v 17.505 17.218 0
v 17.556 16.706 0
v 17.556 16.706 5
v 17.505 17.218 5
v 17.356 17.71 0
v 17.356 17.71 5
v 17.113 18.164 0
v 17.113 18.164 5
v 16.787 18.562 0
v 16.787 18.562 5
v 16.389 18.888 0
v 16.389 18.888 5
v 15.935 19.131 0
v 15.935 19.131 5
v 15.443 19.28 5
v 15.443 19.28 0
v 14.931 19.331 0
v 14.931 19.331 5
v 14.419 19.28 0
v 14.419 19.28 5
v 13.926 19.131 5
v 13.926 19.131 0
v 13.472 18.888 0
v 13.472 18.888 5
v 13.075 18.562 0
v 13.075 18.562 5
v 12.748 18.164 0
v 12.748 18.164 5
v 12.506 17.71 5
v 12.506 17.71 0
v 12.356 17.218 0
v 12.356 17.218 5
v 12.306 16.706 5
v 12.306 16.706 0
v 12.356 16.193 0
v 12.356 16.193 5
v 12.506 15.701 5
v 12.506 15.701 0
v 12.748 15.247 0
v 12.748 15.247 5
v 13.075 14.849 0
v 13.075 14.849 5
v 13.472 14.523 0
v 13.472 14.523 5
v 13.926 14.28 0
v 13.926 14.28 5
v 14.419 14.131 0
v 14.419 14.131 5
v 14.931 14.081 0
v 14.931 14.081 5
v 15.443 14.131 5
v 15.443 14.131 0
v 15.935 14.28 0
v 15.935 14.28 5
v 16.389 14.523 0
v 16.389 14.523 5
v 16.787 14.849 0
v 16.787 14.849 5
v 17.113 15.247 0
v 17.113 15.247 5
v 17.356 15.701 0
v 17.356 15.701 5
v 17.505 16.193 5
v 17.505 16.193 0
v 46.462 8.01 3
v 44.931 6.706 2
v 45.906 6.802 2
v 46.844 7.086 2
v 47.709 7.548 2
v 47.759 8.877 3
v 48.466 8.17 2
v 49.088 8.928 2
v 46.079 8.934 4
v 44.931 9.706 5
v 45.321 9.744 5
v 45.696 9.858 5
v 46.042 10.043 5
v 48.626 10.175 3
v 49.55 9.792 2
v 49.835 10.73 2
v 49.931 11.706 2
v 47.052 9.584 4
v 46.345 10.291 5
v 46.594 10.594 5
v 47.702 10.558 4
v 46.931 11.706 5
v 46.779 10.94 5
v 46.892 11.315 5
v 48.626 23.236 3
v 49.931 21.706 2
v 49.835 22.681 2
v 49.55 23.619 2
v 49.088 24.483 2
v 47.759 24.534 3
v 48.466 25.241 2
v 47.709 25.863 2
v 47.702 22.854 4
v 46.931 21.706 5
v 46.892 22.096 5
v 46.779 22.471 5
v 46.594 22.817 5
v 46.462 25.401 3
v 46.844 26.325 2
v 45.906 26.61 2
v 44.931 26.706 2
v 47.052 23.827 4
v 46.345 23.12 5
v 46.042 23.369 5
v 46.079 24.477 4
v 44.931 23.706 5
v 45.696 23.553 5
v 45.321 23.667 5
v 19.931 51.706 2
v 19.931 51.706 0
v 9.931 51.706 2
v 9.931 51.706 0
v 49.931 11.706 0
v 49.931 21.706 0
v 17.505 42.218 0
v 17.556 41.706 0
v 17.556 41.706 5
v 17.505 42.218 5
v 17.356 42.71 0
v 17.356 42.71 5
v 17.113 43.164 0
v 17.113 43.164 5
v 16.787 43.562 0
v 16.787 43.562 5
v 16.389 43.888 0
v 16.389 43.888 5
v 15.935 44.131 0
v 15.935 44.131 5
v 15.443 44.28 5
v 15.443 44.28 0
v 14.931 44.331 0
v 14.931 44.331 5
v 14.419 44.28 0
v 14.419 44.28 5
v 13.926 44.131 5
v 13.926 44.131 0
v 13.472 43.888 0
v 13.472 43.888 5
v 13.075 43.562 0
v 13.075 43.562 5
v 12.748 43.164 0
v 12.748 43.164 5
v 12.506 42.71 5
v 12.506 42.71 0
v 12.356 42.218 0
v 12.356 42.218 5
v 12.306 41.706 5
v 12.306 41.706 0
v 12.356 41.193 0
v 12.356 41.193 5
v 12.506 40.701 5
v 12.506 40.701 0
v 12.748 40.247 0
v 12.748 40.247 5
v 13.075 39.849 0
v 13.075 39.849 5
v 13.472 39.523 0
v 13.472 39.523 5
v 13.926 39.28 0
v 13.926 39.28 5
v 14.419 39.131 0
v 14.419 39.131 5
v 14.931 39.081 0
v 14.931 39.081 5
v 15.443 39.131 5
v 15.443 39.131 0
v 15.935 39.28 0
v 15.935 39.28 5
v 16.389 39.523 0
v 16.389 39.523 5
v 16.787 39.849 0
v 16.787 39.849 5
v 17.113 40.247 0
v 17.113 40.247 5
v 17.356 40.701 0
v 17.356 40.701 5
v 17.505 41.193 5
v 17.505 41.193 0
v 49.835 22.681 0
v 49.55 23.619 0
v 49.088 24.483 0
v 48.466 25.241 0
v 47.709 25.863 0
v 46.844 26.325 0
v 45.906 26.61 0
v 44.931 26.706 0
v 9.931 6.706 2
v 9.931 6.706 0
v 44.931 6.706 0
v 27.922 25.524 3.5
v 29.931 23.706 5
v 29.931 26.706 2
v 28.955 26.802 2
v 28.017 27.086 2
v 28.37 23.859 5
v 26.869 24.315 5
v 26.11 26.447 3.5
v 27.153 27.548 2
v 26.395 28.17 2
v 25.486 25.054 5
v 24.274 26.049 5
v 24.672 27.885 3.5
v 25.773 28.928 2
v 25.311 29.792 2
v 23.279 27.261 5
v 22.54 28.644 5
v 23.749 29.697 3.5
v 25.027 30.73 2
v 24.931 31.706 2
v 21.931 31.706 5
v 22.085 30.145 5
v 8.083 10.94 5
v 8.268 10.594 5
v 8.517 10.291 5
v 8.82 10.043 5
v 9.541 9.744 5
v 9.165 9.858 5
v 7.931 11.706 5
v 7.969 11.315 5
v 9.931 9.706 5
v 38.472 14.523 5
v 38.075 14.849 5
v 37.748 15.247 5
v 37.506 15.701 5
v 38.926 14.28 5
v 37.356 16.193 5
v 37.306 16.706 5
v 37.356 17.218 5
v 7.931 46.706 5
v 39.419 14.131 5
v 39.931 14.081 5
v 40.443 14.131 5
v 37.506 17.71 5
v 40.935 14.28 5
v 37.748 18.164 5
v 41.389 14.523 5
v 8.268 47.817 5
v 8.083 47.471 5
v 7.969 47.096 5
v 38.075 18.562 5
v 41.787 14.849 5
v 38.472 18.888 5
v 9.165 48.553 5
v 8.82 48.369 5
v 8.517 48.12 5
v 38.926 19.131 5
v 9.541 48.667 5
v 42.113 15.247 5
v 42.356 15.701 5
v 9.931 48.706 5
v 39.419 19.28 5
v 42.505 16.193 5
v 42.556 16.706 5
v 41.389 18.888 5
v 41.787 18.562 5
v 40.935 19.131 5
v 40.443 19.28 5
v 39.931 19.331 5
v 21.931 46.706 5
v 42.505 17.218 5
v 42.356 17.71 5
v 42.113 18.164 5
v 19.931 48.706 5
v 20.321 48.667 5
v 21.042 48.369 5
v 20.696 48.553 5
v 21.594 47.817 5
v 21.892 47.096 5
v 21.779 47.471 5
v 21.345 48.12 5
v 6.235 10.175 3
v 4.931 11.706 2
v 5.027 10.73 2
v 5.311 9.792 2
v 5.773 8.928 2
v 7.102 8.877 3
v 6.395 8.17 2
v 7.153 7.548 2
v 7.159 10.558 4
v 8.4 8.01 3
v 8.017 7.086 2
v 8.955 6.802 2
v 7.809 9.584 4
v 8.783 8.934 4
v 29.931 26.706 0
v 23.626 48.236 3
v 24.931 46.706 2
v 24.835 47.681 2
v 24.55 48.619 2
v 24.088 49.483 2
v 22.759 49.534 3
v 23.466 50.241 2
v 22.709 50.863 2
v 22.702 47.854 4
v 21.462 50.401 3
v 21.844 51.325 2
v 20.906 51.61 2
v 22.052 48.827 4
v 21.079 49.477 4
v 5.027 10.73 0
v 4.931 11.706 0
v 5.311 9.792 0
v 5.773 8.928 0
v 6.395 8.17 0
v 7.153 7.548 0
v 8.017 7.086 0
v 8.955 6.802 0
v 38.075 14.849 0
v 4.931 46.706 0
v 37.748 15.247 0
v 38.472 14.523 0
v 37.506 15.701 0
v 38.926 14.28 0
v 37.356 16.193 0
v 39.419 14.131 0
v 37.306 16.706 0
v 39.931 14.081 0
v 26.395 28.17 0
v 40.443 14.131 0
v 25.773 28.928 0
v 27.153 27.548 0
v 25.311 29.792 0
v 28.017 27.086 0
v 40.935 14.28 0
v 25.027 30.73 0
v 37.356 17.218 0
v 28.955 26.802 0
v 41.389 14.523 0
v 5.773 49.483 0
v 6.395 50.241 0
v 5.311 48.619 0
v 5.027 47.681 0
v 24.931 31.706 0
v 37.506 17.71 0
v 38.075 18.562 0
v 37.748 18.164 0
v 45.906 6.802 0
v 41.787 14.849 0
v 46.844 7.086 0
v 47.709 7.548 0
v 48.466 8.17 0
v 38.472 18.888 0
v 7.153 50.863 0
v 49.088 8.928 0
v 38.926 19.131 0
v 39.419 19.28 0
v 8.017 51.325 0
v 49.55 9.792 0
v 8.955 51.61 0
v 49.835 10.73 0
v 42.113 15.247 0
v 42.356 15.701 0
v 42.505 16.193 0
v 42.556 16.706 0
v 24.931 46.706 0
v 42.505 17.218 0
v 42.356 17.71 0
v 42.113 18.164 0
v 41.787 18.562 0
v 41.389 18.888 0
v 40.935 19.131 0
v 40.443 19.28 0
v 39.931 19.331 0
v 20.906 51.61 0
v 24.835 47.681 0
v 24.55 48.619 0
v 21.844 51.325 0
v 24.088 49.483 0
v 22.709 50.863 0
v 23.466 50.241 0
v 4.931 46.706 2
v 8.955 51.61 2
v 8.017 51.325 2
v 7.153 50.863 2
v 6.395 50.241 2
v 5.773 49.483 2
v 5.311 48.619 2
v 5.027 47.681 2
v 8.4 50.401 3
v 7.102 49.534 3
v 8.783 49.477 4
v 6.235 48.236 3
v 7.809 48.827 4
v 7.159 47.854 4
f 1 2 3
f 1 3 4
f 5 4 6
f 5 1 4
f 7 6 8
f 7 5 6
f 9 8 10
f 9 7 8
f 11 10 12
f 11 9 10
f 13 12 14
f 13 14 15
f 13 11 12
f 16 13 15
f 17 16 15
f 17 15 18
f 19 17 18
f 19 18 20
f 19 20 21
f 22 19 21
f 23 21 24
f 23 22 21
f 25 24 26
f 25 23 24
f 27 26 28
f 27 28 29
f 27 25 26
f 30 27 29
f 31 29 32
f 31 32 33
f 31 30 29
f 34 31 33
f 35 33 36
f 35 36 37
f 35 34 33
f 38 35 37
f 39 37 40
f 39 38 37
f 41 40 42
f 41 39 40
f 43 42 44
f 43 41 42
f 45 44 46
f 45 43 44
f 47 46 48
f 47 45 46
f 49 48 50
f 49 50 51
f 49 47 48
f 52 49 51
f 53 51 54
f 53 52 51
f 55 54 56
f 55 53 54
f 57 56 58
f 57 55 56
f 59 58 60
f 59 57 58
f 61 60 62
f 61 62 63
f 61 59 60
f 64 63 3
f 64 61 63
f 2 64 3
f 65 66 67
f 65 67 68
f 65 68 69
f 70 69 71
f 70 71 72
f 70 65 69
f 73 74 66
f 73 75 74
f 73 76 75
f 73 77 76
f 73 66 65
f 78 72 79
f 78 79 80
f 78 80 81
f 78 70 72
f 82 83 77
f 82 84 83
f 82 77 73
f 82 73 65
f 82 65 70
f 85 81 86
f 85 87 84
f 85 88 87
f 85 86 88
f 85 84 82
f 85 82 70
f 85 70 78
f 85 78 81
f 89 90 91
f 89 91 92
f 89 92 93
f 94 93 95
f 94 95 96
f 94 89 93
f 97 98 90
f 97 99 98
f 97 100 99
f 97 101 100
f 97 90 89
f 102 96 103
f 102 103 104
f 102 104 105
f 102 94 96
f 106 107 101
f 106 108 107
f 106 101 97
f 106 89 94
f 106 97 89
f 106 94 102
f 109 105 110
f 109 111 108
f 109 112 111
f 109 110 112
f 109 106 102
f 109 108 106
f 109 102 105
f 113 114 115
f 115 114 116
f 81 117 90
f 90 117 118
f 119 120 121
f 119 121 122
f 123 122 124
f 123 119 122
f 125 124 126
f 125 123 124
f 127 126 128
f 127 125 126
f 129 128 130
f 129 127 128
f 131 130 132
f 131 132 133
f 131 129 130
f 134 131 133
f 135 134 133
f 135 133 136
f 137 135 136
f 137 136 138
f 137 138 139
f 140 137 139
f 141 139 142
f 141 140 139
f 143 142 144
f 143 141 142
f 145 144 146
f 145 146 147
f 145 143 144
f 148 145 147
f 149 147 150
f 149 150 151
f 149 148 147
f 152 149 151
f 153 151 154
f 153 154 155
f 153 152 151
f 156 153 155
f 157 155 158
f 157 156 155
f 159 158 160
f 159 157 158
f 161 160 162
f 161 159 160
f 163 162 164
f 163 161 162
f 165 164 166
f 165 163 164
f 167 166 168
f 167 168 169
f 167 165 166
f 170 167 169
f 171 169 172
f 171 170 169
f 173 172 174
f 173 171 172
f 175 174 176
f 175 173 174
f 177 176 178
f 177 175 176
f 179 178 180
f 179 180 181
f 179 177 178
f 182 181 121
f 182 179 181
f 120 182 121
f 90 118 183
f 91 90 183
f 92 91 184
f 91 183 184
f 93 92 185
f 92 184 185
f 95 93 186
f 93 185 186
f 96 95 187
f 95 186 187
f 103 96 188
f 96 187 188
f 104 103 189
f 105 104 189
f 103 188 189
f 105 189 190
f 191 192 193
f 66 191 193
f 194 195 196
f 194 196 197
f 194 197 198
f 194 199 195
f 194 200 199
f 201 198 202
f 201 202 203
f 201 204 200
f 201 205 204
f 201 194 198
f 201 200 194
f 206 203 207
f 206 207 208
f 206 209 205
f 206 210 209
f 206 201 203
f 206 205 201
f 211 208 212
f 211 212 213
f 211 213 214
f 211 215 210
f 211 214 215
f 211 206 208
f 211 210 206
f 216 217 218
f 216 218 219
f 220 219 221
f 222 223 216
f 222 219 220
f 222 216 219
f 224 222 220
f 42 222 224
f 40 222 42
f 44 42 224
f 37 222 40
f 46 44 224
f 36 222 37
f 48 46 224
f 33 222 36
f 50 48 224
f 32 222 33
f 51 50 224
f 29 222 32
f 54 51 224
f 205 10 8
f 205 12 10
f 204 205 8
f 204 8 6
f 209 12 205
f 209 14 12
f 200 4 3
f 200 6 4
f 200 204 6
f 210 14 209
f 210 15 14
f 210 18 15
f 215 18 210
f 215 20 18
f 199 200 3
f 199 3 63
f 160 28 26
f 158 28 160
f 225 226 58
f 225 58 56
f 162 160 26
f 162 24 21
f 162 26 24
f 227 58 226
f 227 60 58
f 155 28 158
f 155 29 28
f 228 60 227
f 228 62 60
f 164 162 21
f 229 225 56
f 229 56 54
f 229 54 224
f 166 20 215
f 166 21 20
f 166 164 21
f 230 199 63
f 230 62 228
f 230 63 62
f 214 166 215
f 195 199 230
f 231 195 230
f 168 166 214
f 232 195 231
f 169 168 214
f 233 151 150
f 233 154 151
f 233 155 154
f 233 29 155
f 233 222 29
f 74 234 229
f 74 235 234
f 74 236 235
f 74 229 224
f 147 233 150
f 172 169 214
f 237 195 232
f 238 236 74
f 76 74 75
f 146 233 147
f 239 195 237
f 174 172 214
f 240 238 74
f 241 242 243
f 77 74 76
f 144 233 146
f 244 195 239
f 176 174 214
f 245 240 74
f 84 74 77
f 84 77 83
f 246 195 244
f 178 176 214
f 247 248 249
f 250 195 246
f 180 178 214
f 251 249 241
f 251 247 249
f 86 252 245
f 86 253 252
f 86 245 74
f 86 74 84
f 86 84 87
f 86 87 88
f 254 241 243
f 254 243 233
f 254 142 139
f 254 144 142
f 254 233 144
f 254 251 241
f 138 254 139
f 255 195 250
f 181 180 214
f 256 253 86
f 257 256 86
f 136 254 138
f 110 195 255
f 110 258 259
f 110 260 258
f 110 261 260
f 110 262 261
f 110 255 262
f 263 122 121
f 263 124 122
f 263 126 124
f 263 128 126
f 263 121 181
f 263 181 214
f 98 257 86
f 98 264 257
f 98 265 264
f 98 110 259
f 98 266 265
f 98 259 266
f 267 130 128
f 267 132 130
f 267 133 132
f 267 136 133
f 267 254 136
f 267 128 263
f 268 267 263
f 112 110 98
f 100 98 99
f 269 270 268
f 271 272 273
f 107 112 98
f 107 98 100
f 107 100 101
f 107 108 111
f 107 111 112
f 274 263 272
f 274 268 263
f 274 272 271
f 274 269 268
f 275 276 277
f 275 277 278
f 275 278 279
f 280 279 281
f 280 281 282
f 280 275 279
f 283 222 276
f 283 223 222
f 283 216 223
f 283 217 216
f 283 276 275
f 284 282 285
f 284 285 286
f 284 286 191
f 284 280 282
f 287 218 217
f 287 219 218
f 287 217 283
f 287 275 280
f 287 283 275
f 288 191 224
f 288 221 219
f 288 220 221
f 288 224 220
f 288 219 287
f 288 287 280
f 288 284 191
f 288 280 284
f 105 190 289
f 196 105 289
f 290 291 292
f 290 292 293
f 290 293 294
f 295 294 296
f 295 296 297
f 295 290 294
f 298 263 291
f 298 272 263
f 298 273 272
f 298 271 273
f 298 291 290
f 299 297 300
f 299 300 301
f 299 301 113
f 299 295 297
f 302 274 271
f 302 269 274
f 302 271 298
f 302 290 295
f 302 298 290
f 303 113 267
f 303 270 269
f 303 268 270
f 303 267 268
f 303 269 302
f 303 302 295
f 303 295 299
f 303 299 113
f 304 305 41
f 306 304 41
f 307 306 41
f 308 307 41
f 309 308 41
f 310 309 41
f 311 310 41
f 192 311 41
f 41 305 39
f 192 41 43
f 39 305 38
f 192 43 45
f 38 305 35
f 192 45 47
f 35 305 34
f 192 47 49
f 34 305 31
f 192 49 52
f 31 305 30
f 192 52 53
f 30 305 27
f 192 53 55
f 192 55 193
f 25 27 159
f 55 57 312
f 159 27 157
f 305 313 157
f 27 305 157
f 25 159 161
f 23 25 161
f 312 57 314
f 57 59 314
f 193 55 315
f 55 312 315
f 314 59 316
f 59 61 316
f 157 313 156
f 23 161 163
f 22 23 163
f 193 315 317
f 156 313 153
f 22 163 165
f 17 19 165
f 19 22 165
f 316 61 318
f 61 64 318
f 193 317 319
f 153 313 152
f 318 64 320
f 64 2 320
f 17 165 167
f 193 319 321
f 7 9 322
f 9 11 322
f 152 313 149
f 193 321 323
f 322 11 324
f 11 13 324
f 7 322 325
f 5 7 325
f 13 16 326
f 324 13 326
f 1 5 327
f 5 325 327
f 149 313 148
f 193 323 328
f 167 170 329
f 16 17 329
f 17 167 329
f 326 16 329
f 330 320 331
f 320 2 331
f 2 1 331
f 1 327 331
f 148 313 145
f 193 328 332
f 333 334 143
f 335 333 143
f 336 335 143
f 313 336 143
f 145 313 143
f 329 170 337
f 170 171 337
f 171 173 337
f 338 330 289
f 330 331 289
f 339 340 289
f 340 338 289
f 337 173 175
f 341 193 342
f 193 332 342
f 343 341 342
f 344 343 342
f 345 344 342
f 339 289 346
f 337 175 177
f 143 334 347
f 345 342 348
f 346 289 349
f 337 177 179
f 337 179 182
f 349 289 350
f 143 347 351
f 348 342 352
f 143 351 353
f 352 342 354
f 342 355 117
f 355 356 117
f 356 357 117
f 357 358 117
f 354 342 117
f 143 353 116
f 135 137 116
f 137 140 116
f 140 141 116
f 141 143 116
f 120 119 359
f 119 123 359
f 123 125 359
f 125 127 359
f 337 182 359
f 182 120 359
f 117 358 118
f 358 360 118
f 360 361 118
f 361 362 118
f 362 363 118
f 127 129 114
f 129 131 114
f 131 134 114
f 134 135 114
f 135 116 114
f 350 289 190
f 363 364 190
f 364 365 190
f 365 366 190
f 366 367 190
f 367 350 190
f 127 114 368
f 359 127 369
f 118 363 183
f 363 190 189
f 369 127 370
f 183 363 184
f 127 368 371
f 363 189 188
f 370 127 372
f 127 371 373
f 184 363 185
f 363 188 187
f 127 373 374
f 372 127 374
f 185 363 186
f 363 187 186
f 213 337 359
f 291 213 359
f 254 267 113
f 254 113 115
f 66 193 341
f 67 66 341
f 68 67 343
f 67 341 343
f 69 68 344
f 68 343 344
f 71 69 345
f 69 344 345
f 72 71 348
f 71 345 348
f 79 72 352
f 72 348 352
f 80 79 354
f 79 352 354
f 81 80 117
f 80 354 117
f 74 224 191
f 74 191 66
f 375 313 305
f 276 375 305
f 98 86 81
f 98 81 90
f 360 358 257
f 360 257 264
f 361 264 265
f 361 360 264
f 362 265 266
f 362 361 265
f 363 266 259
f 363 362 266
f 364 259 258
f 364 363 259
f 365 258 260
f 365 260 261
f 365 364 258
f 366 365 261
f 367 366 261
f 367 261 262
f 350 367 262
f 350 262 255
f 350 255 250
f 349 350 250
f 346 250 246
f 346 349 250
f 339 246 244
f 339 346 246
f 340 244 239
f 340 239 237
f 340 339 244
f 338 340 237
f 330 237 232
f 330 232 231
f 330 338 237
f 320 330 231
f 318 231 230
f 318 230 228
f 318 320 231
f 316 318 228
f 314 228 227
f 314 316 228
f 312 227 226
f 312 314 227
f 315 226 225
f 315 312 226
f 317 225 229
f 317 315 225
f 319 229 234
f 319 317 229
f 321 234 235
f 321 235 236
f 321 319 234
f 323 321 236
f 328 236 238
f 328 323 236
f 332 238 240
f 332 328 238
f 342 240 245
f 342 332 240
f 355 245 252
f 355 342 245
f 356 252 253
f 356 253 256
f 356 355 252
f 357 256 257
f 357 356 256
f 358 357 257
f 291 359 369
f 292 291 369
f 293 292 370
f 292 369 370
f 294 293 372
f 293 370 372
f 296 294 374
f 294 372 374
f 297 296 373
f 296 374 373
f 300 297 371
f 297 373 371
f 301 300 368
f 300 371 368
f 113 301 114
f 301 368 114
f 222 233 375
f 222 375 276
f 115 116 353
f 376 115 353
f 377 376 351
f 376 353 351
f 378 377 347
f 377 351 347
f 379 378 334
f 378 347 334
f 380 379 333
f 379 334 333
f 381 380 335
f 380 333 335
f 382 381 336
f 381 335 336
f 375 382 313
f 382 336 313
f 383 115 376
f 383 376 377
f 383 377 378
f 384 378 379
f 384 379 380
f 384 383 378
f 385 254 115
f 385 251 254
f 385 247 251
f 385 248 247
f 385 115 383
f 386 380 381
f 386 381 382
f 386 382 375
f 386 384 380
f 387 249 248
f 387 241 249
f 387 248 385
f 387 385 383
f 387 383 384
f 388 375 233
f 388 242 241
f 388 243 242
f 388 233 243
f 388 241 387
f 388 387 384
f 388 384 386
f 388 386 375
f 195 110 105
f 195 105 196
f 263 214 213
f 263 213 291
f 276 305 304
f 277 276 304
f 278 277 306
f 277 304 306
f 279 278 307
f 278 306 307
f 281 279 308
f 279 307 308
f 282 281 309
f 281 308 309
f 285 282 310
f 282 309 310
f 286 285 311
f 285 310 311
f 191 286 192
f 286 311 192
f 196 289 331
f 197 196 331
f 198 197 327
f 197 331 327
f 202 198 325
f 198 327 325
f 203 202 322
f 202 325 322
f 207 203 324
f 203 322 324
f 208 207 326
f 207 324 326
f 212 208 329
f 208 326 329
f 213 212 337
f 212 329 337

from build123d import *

# Parameters (mm, degrees)
F0_R     = 2.625
F1_DEPTH = 5
F2_SIZE  = 3


with BuildPart() as f1:
    # F0 (on Top) → F1 (new body)
    with BuildSketch(Plane.XY):
        with BuildLine():
            ThreePointArc((4.930798, 11.705586), (6.395264, 8.170052), (9.930798, 6.705586))
            Line((9.930798, 6.705586), (44.930798, 6.705586))
            ThreePointArc((44.930798, 6.705586), (48.466332, 8.170052), (49.930798, 11.705586))
            Line((49.930798, 11.705586), (49.930798, 21.705586))
            ThreePointArc((49.930798, 21.705586), (48.466332, 25.241119), (44.930798, 26.705586))
            Line((44.930798, 26.705586), (29.930798, 26.705586))
            ThreePointArc((29.930798, 26.705586), (26.395264, 28.170052), (24.930798, 31.705586))
            Line((24.930798, 31.705586), (24.930798, 46.705586))
            ThreePointArc((24.930798, 46.705586), (23.466332, 50.241119), (19.930798, 51.705586))
            Line((19.930798, 51.705586), (9.930798, 51.705586))
            ThreePointArc((9.930798, 51.705586), (6.395264, 50.241119), (4.930798, 46.705586))
            Line((4.930798, 46.705586), (4.930798, 26.705586))
            Line((4.930798, 26.705586), (4.930798, 11.705586))
        make_face()
        with Locations((14.930798, 16.705586)):
            Circle(F0_R, mode=Mode.SUBTRACT)
        with Locations((39.930798, 16.705586)):
            Circle(F0_R, mode=Mode.SUBTRACT)
        with Locations((14.930798, 41.705586)):
            Circle(F0_R, mode=Mode.SUBTRACT)
    extrude(amount=F1_DEPTH)

    # F2
    f2_edges = [f1.edges().sort_by_distance(p)[0] for p in [
        (14.930798, 51.705586, 5),
        (23.466332, 50.241119, 5),
        (24.930798, 39.205586, 5),
        (26.395264, 28.170052, 5),
        (37.430798, 26.705586, 5),
        (48.466332, 25.241119, 5),
        (49.930798, 16.705586, 5),
        (48.466332, 8.170052, 5),
        (27.430798, 6.705586, 5),
        (6.395264, 8.170052, 5),
        (4.930798, 29.205586, 5),
        (6.395264, 50.241119, 5),
    ]]
    chamfer(f2_edges, length=F2_SIZE)


solid = f1.part
